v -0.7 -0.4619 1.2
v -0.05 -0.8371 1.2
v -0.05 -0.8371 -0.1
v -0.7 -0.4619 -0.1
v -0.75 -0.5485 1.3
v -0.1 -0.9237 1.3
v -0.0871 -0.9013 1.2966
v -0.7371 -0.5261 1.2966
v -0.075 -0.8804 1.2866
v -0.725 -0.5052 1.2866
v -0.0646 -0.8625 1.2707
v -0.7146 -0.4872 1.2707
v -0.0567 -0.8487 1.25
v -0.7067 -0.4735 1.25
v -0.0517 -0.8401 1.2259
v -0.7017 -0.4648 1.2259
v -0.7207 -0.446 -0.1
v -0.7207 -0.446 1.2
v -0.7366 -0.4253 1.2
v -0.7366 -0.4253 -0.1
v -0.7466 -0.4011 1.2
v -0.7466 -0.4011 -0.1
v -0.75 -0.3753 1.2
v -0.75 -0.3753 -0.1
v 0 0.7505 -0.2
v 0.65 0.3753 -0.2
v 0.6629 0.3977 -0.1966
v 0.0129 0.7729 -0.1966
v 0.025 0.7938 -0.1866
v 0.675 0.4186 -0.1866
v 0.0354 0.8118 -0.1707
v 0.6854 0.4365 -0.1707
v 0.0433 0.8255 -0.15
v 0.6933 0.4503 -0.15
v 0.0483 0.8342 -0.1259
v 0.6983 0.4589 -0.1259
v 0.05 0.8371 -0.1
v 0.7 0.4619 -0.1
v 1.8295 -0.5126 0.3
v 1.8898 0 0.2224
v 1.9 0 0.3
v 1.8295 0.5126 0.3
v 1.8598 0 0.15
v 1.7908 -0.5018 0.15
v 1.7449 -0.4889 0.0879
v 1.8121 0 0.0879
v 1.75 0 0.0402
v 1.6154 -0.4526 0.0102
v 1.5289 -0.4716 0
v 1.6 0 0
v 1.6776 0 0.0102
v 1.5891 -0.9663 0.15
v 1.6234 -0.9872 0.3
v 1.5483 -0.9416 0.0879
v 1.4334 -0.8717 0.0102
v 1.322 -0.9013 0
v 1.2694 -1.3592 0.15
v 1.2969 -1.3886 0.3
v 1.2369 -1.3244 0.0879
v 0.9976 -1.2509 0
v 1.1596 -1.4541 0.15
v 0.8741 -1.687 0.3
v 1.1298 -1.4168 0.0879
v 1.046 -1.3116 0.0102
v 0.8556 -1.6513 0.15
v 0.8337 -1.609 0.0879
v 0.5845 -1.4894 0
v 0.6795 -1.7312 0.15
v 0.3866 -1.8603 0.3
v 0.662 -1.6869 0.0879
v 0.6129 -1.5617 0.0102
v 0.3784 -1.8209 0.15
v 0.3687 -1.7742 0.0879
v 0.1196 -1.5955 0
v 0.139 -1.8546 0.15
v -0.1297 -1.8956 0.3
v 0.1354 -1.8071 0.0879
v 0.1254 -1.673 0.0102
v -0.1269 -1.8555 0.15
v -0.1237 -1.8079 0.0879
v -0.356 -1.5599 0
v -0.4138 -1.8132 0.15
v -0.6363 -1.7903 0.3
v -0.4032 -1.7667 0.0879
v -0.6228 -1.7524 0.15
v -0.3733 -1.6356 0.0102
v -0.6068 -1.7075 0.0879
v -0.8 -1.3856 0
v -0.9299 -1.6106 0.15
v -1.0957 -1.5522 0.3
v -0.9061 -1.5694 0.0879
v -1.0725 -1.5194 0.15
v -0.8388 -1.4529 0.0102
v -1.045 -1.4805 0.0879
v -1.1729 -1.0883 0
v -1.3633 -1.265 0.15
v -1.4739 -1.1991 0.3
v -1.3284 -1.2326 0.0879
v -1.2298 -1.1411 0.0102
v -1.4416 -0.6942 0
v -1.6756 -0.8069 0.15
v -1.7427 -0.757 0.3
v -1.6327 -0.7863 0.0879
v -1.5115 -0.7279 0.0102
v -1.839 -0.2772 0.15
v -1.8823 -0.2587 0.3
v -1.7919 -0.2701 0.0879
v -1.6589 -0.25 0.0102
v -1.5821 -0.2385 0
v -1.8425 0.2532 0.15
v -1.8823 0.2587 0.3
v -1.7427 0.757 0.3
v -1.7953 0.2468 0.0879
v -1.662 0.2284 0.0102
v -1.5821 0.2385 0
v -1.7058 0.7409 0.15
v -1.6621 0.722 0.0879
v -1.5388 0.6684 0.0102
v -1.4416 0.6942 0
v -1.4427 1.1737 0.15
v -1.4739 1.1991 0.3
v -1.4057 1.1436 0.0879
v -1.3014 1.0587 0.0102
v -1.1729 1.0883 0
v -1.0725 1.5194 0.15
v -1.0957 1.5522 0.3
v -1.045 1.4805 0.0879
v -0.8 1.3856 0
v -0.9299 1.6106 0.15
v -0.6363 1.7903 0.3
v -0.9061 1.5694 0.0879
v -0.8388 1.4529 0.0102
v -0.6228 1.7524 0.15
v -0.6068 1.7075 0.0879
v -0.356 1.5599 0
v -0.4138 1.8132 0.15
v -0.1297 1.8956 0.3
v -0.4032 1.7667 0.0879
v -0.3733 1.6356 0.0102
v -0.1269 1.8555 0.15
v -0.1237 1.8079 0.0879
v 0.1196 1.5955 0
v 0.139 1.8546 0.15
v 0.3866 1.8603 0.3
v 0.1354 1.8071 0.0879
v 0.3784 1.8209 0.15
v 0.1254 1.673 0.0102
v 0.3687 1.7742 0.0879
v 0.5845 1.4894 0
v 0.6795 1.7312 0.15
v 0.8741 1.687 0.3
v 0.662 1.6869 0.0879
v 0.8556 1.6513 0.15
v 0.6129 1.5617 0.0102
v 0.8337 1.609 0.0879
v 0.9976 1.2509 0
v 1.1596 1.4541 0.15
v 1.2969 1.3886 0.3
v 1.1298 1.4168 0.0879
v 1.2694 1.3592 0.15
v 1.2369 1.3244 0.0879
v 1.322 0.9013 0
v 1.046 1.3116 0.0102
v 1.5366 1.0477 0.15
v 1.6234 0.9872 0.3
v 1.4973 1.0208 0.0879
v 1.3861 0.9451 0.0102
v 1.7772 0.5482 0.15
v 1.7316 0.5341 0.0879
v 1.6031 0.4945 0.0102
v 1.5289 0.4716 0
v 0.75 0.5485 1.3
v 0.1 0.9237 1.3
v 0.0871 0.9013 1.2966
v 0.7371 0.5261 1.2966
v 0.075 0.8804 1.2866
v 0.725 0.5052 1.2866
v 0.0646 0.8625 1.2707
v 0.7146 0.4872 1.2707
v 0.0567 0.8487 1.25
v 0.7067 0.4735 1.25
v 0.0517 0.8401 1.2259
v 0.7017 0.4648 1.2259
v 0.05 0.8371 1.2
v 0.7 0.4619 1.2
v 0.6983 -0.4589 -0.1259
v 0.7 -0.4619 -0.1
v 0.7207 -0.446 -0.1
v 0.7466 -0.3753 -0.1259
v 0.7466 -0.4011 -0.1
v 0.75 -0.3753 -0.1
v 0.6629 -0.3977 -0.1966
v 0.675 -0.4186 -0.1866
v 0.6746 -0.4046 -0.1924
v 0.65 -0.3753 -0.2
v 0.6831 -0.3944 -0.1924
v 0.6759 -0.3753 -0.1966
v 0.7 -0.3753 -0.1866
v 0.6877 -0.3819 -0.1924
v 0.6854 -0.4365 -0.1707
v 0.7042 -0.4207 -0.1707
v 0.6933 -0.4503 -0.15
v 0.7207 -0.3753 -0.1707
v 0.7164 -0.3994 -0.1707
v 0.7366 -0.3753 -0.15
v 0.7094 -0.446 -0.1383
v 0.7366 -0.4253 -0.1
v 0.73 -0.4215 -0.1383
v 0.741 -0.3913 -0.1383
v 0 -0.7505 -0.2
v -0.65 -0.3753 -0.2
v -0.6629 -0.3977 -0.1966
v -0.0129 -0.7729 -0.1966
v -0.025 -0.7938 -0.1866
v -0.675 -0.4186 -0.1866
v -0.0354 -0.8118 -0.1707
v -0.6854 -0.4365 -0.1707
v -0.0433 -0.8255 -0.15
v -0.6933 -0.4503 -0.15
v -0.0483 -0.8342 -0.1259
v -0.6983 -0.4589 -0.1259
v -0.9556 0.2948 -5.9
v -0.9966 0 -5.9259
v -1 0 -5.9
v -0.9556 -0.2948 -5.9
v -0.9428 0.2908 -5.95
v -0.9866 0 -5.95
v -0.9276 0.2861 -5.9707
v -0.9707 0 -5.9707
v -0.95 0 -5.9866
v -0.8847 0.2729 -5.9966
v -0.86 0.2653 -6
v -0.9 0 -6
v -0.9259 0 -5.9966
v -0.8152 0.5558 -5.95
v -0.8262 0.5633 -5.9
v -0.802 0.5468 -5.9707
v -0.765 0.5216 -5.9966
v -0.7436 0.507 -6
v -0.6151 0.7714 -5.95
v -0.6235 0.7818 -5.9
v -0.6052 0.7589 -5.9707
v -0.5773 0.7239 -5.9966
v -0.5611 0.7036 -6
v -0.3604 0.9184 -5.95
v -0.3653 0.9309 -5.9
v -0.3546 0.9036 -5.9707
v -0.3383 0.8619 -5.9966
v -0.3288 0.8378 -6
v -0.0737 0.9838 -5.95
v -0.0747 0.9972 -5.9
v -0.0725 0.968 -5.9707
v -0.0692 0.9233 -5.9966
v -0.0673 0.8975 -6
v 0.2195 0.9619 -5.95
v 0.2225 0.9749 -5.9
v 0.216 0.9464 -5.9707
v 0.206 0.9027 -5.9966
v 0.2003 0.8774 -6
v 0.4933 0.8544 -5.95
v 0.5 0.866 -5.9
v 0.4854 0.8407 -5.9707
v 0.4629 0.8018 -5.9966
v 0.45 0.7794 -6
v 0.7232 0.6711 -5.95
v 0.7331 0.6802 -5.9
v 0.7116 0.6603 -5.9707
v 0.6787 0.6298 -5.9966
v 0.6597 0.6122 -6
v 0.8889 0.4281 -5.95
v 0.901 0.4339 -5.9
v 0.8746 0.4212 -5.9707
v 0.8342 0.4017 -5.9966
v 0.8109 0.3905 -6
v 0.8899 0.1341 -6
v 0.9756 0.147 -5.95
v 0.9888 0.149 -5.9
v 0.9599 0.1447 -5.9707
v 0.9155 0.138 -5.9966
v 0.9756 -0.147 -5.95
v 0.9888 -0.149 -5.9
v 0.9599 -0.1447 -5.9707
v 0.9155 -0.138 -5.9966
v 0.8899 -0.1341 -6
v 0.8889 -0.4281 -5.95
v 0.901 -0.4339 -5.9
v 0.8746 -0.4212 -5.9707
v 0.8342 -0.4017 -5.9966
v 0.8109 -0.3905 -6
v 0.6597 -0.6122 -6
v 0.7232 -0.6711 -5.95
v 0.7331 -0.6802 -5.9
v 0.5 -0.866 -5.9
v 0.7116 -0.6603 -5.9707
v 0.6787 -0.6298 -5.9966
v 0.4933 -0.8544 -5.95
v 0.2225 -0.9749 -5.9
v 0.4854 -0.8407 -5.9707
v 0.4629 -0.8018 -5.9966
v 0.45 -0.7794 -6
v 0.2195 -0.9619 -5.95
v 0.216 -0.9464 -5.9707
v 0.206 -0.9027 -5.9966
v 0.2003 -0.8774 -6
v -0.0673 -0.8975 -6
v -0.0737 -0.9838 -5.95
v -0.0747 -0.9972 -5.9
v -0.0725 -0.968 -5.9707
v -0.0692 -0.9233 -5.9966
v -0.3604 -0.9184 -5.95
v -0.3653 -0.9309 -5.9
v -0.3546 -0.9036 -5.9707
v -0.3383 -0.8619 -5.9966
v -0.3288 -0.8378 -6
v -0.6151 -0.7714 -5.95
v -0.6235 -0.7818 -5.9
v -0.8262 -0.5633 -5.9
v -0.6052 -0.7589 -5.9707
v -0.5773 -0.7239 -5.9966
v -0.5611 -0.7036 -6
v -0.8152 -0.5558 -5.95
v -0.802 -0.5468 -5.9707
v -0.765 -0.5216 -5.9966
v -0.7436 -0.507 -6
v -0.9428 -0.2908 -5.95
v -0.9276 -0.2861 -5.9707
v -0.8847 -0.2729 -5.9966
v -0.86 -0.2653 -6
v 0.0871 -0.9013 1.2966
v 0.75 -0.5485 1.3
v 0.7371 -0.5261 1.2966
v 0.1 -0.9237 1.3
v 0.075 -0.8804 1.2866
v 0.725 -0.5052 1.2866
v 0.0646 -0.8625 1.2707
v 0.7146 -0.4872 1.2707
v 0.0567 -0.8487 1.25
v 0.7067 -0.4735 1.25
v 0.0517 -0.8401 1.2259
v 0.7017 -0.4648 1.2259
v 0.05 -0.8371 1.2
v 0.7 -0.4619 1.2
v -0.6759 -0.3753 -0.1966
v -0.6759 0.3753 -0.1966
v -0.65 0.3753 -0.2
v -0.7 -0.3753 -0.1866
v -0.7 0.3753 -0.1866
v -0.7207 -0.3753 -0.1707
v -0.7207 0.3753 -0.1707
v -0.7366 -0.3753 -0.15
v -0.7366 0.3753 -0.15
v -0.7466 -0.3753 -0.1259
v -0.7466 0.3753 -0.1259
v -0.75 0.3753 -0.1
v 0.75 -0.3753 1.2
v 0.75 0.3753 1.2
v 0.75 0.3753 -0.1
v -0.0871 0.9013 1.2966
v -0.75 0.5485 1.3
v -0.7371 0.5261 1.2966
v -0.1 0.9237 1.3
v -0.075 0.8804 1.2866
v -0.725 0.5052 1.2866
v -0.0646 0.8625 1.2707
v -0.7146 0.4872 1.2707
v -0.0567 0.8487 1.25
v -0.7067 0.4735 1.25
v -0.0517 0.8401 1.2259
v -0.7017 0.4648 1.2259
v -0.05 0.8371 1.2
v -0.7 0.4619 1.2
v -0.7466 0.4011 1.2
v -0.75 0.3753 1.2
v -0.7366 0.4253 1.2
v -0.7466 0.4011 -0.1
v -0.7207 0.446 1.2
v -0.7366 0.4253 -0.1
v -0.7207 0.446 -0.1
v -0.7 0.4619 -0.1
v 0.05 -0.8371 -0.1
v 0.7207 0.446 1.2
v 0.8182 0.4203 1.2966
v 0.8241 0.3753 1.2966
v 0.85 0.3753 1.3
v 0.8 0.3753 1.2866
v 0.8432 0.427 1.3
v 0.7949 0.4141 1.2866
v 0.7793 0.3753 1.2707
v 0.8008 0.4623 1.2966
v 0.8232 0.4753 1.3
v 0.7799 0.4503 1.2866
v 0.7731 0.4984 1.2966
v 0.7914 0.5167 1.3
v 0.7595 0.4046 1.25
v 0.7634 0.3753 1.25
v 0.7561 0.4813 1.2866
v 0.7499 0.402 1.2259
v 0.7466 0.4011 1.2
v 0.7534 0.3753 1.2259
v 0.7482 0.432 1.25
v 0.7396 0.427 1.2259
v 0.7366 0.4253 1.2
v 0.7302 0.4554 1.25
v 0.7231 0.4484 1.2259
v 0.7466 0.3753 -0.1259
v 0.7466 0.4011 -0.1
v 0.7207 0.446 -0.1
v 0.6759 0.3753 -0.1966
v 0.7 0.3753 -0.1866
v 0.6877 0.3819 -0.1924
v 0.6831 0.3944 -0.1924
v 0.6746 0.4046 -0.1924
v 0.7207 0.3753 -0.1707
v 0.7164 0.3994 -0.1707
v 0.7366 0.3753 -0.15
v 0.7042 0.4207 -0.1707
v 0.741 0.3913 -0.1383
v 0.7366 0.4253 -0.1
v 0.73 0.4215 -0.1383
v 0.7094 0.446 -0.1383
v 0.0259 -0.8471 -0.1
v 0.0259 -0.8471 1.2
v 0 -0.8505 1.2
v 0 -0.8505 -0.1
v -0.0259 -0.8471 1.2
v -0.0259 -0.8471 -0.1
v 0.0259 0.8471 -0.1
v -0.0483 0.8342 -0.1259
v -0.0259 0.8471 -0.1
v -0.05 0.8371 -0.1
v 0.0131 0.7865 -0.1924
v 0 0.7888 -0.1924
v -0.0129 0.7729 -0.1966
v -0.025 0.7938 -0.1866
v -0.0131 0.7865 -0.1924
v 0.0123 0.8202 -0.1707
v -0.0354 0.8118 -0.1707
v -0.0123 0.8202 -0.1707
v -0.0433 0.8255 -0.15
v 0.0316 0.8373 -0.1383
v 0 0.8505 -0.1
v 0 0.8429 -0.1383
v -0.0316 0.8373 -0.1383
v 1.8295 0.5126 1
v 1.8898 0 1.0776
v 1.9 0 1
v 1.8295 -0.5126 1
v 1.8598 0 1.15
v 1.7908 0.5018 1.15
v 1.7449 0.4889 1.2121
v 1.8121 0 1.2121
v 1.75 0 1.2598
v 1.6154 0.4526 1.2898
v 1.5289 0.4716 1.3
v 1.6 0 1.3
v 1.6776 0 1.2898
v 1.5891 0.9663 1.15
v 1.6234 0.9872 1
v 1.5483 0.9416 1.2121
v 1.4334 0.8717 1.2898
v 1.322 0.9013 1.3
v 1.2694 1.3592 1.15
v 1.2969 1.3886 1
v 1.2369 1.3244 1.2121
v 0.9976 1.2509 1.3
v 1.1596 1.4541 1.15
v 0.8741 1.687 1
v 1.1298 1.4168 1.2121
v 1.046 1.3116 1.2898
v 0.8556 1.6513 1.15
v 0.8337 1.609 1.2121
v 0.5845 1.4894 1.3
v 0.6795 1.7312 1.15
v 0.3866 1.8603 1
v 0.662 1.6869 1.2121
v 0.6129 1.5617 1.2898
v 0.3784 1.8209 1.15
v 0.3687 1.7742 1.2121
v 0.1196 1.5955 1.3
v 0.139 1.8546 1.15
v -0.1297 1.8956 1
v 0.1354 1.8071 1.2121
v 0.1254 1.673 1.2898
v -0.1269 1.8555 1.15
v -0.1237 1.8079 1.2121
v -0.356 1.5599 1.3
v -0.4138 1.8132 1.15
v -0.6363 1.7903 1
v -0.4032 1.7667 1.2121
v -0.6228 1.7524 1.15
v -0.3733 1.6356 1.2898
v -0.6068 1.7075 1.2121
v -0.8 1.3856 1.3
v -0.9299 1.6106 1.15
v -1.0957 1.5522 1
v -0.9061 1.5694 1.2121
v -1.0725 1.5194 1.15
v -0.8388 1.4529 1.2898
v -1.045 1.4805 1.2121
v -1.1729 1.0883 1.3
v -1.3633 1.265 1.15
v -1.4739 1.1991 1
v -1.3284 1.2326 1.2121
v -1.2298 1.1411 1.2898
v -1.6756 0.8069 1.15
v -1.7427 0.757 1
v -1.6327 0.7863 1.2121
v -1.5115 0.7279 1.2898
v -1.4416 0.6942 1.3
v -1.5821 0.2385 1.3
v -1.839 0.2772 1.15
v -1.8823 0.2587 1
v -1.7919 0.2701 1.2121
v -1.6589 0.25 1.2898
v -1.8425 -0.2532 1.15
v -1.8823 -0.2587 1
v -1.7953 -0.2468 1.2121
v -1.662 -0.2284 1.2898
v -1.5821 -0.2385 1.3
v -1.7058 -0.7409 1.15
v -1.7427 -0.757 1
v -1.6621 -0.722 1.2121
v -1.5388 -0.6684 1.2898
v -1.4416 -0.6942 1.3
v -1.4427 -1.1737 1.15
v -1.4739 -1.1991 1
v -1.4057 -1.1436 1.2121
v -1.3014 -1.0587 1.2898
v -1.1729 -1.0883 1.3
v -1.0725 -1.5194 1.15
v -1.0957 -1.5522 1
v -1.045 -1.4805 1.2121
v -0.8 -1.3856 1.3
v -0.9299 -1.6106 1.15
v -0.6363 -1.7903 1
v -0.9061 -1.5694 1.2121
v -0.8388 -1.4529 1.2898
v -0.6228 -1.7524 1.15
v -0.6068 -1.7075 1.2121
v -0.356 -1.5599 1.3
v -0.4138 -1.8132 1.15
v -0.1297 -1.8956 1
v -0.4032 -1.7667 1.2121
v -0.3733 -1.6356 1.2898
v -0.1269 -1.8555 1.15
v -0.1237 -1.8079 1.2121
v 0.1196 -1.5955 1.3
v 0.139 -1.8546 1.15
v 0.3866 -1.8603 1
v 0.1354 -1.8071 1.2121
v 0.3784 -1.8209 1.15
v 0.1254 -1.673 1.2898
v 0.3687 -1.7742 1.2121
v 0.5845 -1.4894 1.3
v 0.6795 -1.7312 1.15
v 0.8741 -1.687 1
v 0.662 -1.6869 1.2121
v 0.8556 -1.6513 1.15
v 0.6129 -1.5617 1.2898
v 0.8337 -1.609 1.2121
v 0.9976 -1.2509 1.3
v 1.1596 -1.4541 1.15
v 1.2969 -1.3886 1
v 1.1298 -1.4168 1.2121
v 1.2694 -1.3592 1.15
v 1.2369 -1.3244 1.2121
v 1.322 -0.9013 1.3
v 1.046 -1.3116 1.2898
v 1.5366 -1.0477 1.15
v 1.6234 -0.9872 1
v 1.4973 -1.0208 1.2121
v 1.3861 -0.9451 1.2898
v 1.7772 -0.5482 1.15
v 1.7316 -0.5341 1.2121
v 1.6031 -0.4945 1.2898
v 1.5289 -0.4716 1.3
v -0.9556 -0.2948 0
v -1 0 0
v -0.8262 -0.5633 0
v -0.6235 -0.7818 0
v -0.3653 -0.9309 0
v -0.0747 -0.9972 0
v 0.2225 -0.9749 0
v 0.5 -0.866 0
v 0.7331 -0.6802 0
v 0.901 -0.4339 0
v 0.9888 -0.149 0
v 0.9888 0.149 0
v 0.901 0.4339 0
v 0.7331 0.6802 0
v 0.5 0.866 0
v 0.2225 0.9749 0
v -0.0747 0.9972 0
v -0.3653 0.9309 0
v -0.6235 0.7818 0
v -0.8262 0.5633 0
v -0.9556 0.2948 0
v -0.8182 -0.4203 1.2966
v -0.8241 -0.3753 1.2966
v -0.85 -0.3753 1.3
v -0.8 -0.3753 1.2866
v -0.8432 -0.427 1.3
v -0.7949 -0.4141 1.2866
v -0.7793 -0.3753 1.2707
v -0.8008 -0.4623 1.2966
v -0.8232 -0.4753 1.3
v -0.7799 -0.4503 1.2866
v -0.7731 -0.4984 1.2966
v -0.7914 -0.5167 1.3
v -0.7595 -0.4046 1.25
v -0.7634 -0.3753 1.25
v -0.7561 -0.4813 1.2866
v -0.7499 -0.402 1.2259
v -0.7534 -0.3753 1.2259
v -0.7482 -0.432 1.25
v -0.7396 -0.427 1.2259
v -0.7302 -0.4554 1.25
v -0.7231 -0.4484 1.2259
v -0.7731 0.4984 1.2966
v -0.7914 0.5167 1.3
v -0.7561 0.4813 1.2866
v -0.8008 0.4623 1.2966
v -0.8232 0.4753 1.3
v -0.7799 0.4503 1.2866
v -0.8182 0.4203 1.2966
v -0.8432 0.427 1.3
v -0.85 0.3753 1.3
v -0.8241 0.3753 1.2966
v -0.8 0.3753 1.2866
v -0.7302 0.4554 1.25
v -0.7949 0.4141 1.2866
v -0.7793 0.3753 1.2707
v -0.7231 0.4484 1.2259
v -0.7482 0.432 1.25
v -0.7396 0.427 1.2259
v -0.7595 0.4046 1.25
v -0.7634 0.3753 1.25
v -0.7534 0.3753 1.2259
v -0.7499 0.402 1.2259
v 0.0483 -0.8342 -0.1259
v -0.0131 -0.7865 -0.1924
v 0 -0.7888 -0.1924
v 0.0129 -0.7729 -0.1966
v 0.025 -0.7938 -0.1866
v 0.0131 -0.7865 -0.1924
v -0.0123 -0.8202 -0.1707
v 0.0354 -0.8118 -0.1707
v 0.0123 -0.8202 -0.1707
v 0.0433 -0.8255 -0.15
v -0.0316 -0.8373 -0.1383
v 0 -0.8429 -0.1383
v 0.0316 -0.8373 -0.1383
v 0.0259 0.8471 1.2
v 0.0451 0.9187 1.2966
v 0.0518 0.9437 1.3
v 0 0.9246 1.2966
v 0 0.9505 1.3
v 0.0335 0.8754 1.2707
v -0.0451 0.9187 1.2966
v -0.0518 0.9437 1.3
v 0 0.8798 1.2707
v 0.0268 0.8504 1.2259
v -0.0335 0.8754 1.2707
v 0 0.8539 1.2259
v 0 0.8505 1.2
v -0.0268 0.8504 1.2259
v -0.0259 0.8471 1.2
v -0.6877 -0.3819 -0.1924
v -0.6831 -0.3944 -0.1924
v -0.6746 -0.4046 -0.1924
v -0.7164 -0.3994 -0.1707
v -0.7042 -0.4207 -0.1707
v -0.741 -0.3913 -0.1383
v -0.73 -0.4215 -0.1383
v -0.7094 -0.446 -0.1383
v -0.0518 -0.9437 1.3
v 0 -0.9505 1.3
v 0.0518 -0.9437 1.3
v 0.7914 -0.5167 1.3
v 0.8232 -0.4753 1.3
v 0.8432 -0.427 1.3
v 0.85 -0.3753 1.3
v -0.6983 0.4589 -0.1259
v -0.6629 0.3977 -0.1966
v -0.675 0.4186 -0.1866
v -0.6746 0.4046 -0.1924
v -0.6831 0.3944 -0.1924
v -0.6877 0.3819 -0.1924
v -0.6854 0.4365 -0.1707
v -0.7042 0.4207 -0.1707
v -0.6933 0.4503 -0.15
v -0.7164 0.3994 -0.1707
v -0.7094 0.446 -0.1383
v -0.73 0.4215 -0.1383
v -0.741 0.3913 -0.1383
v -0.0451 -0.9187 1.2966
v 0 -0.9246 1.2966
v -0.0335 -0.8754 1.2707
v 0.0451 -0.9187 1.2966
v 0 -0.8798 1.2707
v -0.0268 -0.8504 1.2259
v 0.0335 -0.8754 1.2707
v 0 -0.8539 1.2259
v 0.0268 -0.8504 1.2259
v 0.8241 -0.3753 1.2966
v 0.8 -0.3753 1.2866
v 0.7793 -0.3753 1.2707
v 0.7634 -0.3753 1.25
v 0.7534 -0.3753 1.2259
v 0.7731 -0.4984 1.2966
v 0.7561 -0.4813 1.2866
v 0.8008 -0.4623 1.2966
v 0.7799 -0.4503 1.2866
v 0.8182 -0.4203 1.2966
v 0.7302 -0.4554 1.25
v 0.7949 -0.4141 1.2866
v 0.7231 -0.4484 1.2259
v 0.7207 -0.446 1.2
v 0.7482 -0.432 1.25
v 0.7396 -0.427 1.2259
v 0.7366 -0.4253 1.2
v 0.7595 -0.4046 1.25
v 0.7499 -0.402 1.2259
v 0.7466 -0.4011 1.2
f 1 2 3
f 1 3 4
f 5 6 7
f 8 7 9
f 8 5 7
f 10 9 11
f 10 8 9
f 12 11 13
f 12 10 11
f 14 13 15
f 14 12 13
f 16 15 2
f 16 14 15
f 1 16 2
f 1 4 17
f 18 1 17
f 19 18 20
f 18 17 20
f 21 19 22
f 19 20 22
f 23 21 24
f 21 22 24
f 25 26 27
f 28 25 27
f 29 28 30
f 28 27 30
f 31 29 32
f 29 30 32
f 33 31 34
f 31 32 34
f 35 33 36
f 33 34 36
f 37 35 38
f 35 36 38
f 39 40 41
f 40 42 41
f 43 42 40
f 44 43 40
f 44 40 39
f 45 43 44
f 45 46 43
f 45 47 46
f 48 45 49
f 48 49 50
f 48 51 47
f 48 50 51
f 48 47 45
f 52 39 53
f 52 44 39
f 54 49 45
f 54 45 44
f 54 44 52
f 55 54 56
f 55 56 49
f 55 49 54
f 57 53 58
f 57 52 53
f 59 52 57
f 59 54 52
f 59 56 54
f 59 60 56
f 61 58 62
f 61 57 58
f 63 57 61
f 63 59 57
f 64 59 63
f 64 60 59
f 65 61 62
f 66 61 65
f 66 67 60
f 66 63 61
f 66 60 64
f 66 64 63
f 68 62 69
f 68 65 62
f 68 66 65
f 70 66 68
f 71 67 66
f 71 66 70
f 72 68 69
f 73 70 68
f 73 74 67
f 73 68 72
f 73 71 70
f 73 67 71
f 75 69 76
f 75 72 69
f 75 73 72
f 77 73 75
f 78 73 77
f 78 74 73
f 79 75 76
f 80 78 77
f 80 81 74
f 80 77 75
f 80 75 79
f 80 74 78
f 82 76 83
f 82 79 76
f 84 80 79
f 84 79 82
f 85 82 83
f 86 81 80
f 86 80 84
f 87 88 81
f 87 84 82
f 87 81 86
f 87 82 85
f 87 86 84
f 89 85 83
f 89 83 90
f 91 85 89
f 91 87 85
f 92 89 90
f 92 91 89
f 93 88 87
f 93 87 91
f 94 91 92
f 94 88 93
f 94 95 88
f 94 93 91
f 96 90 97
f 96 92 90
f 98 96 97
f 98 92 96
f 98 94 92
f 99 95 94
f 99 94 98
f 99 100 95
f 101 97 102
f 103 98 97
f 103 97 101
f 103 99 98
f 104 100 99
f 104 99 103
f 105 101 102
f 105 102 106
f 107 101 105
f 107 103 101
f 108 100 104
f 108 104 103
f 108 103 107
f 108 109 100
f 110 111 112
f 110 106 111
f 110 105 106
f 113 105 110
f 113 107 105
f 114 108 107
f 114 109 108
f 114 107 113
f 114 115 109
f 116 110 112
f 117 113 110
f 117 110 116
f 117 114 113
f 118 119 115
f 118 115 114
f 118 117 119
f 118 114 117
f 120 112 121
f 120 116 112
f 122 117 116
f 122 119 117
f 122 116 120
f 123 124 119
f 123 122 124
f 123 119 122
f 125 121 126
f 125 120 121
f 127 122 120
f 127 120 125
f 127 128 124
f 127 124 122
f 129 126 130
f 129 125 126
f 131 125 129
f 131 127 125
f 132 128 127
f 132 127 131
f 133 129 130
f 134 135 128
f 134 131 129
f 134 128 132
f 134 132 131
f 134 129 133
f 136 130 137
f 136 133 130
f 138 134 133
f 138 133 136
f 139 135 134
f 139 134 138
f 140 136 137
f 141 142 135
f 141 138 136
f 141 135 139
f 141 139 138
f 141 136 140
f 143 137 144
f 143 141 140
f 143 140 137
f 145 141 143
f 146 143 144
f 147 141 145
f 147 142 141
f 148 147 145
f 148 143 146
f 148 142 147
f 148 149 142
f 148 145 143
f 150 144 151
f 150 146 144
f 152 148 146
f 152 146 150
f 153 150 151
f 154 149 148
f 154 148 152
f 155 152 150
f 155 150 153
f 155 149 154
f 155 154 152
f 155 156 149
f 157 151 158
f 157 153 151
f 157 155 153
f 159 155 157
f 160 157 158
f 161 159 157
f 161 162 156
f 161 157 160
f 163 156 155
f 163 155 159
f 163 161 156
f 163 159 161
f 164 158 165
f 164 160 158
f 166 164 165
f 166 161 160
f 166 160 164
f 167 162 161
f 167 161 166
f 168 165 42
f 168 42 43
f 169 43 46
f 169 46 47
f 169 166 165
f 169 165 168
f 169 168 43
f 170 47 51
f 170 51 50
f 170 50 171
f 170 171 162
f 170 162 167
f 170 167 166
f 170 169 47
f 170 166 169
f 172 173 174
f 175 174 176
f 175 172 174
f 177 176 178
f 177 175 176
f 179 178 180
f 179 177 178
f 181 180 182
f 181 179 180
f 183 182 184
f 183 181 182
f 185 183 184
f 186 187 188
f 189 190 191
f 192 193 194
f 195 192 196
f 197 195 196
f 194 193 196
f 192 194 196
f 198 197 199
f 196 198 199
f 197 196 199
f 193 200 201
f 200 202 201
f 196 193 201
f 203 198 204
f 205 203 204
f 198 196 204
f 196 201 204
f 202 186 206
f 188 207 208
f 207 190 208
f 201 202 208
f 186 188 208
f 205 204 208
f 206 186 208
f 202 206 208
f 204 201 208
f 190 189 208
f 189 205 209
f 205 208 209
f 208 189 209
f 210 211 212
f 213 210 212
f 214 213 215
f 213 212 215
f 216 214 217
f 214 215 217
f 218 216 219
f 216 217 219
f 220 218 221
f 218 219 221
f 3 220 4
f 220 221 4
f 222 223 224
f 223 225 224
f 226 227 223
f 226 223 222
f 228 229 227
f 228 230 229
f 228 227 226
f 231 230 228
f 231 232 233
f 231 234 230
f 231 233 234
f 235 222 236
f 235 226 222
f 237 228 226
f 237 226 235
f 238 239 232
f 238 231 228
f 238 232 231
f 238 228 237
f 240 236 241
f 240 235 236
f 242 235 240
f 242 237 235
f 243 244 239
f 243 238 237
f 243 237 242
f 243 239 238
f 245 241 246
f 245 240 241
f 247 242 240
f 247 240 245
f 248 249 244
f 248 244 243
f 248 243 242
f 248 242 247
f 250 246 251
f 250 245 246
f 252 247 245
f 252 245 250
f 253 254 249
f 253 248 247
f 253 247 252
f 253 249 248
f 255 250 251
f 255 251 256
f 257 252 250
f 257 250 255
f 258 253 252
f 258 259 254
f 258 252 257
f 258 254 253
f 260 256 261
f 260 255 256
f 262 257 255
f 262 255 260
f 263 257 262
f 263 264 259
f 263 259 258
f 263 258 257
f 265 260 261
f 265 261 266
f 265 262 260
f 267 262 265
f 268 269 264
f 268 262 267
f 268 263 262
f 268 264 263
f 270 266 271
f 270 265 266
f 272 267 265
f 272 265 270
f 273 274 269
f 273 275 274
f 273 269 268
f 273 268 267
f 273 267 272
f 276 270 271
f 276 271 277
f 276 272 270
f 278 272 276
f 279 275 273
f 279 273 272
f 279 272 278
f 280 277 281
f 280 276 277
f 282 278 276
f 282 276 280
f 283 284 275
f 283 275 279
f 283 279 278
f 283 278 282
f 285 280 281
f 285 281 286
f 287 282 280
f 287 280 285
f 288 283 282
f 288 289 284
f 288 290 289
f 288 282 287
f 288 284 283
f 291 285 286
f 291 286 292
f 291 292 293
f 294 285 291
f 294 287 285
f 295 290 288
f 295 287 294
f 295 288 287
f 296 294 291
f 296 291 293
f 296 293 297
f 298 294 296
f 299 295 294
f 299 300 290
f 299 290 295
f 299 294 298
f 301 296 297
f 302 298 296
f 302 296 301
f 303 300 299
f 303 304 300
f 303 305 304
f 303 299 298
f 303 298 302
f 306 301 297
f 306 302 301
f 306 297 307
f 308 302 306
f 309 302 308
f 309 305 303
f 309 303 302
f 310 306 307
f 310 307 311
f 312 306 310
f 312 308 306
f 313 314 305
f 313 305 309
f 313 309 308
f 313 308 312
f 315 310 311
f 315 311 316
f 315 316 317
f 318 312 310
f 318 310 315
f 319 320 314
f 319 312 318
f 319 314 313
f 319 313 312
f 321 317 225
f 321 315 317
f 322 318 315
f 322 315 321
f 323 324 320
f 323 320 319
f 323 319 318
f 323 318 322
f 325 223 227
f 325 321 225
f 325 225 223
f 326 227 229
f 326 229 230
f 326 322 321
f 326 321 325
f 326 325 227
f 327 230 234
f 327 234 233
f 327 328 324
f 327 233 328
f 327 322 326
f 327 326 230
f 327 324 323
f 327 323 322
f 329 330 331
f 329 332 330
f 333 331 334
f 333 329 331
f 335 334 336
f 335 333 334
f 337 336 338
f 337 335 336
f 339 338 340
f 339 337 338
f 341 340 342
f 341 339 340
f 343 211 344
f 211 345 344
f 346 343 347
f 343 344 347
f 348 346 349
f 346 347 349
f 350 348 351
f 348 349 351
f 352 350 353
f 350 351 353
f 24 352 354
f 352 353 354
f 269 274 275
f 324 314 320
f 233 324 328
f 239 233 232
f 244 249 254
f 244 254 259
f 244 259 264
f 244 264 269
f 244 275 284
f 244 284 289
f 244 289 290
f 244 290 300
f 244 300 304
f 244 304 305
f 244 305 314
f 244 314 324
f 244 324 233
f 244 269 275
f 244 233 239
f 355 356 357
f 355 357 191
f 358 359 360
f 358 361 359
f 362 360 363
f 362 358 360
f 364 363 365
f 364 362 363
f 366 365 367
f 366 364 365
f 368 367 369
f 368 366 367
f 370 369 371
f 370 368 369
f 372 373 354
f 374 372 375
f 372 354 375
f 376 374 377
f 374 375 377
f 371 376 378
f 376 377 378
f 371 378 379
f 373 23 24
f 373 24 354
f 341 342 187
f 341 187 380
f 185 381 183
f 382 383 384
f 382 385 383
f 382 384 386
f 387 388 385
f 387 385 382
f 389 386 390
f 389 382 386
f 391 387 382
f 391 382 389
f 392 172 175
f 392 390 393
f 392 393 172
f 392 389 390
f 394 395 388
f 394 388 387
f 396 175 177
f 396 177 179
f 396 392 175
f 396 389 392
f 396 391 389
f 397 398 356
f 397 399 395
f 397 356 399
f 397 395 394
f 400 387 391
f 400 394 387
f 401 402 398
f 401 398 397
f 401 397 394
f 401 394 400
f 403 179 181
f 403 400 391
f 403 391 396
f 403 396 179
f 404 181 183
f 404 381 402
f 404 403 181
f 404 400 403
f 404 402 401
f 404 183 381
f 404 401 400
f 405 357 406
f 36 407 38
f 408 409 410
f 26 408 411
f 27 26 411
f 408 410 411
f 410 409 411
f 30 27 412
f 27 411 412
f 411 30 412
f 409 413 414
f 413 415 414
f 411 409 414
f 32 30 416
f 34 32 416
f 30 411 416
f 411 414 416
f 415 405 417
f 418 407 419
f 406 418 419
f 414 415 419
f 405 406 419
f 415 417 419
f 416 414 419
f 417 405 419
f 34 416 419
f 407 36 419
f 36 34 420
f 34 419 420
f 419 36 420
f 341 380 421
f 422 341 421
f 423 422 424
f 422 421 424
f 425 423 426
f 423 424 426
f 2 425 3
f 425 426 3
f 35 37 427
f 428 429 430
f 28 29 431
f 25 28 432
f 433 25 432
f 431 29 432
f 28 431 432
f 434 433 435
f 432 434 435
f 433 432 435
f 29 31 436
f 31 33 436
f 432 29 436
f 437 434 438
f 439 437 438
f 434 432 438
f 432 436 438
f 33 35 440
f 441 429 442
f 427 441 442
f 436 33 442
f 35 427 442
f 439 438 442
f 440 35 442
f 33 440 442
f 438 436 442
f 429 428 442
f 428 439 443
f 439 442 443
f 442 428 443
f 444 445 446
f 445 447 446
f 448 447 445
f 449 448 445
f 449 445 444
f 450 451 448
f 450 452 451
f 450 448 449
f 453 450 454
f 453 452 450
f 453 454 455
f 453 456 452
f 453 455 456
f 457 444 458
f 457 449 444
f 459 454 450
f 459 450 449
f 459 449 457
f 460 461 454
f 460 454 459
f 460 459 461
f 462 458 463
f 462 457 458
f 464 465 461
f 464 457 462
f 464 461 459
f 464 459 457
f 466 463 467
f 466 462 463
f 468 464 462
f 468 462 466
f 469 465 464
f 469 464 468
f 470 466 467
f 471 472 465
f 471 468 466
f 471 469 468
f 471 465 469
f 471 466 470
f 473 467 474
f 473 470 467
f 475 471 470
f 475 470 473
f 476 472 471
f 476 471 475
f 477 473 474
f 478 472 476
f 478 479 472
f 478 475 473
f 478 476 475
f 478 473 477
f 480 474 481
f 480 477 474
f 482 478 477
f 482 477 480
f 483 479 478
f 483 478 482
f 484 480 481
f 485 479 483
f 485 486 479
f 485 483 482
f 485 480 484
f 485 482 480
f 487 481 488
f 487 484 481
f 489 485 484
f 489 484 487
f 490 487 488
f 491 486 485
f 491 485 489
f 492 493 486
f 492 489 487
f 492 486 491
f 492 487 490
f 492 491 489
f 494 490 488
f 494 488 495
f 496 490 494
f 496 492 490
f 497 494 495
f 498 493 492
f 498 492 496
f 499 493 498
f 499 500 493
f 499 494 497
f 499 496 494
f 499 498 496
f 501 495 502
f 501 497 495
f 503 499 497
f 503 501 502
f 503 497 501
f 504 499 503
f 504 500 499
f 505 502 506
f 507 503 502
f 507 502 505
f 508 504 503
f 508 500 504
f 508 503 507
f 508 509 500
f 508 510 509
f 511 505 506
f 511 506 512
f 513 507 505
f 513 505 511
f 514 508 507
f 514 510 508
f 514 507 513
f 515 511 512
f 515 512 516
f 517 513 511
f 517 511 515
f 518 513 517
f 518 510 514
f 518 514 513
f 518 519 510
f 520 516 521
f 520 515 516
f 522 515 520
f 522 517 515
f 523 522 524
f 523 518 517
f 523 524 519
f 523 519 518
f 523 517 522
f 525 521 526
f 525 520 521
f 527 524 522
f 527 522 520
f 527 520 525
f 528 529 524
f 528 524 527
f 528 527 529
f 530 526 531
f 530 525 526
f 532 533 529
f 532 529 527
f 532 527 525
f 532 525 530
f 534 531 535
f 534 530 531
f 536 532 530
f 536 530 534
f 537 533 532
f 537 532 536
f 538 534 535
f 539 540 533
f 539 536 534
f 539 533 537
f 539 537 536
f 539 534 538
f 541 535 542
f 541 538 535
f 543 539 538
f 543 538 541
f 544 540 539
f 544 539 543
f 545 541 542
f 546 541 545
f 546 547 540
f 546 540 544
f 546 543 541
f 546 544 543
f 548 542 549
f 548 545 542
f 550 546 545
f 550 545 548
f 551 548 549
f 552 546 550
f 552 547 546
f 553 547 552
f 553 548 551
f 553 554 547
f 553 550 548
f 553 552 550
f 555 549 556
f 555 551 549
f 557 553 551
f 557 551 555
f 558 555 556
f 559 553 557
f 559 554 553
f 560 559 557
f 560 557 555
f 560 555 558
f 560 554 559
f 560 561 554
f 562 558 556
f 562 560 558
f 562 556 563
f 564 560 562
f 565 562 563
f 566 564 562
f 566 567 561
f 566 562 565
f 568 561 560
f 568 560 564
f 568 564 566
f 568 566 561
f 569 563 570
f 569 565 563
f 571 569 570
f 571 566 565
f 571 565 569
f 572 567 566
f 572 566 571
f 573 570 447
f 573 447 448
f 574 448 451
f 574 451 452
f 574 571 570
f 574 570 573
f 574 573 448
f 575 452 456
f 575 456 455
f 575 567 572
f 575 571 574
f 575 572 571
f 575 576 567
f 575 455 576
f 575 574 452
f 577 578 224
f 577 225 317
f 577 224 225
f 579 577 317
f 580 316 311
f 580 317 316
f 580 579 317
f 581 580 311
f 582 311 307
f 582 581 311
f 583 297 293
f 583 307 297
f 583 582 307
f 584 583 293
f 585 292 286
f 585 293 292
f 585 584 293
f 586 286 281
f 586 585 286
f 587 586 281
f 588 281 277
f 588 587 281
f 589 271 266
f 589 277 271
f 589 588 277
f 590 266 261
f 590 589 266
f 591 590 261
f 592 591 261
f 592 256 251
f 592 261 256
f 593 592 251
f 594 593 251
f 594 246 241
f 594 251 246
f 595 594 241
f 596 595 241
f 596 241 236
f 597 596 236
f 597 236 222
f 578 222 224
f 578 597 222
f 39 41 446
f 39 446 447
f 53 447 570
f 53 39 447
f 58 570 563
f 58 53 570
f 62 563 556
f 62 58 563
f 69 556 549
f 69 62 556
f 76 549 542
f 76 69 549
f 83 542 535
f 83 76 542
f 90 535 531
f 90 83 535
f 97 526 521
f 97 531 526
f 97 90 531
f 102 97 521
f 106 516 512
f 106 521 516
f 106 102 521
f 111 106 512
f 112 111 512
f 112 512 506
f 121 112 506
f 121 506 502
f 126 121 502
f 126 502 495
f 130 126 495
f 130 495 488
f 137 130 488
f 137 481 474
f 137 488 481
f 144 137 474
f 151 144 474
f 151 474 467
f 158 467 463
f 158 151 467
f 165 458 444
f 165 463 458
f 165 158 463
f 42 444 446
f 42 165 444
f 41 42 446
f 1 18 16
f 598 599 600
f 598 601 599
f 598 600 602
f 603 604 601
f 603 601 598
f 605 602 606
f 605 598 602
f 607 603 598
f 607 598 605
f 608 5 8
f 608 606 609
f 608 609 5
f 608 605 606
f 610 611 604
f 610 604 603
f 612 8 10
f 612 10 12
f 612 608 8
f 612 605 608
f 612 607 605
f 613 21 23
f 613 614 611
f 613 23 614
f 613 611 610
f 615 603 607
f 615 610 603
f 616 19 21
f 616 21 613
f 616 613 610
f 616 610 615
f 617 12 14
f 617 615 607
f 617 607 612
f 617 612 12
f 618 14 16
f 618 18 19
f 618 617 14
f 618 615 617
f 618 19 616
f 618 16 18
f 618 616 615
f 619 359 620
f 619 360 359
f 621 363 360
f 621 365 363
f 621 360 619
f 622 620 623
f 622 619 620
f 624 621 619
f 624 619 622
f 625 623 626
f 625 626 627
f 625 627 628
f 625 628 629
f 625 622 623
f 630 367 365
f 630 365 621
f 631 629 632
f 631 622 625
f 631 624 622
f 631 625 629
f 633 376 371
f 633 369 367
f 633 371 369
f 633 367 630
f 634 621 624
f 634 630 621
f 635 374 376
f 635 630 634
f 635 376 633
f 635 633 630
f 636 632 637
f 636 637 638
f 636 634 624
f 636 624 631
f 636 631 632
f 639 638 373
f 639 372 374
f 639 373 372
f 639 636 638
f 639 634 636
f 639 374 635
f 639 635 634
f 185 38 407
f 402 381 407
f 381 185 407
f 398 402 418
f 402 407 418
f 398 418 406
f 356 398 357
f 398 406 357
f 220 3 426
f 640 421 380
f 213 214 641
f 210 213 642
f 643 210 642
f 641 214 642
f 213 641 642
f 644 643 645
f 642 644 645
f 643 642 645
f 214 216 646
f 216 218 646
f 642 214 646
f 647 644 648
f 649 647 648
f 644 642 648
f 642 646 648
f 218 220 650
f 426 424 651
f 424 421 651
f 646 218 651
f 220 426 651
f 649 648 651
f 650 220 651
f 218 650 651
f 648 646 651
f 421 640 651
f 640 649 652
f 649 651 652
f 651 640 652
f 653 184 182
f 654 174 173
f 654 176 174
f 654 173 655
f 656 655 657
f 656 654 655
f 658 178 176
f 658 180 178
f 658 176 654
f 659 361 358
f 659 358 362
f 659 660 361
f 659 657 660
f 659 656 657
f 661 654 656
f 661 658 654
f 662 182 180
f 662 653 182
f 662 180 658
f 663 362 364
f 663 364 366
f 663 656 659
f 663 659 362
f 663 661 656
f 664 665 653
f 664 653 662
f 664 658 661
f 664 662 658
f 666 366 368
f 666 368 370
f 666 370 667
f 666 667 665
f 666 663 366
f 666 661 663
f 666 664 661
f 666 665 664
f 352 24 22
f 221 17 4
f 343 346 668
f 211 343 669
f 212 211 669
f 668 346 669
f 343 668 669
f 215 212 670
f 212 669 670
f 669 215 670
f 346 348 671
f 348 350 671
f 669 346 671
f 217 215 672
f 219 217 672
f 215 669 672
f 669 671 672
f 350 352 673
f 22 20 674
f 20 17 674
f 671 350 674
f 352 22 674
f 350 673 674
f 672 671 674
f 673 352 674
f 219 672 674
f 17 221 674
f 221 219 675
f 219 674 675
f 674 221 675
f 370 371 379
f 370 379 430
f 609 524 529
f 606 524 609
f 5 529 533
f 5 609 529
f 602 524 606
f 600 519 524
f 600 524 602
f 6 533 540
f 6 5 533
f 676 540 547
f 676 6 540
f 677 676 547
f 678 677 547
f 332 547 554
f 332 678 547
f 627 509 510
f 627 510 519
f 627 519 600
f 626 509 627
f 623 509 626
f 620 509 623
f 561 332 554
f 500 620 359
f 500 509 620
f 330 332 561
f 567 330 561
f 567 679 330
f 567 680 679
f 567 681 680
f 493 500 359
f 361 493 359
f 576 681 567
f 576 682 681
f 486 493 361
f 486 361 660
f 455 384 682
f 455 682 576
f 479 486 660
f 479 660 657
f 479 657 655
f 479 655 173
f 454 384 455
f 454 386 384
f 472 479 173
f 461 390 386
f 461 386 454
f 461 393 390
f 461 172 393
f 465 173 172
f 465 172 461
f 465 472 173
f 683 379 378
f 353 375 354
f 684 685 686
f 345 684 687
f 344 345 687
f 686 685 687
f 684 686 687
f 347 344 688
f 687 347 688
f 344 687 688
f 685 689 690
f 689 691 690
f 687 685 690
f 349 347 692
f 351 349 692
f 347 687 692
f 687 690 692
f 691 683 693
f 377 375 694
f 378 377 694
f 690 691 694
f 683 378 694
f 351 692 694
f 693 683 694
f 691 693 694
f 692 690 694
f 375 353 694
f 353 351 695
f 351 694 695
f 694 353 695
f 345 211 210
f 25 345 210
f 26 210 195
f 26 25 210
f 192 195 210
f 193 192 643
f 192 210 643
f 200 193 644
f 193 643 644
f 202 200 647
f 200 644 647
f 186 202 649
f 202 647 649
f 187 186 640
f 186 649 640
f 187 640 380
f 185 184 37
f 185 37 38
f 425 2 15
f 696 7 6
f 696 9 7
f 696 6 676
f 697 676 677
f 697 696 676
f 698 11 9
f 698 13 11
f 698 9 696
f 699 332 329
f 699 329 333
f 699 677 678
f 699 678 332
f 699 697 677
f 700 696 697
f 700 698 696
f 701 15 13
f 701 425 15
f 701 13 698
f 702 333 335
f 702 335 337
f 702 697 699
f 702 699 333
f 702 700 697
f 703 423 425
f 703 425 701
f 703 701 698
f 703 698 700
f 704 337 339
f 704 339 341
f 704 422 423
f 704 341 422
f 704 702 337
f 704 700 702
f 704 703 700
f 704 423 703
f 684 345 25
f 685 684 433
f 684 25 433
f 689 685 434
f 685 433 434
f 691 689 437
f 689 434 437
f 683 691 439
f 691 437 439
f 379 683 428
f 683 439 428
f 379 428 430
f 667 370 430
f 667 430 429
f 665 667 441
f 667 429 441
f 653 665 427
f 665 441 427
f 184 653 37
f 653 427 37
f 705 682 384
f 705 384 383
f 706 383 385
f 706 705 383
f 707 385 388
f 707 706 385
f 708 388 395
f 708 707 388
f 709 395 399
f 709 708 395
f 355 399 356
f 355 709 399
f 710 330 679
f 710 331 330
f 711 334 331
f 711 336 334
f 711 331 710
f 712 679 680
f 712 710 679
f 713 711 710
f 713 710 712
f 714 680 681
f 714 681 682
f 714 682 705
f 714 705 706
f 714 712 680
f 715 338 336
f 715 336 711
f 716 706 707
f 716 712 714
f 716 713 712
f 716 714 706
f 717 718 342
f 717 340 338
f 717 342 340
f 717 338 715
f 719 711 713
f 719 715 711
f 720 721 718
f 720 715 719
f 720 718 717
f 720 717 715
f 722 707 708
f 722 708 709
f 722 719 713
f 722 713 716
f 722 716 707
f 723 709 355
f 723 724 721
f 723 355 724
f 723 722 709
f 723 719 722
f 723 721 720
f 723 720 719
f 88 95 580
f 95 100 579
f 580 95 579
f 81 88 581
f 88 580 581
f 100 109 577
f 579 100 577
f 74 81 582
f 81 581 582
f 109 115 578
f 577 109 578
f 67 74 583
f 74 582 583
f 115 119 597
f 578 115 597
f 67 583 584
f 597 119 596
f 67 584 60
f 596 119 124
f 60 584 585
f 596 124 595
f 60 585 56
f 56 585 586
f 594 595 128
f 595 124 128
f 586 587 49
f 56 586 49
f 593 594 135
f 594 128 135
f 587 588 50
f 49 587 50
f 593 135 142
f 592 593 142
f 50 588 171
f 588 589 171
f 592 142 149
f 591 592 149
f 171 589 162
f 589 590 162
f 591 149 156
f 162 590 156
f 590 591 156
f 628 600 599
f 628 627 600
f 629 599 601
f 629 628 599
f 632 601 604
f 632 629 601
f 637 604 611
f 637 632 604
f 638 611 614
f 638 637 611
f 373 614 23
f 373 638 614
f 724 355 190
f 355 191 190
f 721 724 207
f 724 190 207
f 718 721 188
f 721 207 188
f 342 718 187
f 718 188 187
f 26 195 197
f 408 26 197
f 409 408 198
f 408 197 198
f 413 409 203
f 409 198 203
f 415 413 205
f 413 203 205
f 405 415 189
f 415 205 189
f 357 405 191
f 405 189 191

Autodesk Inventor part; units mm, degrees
ref_plane "YZ Plane" through (0, 0, 0) normal (1, 0, 0) x (0, 1, 0)
ref_plane "XZ Plane" through (0, 0, 0) normal (0, 1, 0) x (-1, 0, 0)
ref_plane "XY Plane" through (0, 0, 0) normal (0, 0, 1) x (1, 0, 0)
sketch "スケッチ1" plane through (0, 0, 0) normal (0, 0, 1) x (1, 0, 0)
  circle A0 centre (0, 0) radius 1.9
  dimension "d0" = 3.8
extrude "押し出し1" add sketch "スケッチ1" along normal blind 1.3
sketch "スケッチ2" plane through (0, 0, 0) normal (0, 0, -1) x (-1, 0, 0)
  circle A0 centre (0, 0) radius 1.9 projected
  circle A1 centre (0, 0) radius 1
  dimension "d3" = 2
extrude "押し出し2" add sketch "スケッチ2" along normal blind 6 contours A1
sketch "スケッチ3" plane through (0, 0, 1.3) normal (0, 0, 1) x (1, 0, 0)
  circle A0 centre (0, 0) radius 1.9 projected
  line L0 (0, 0.866) -> (0.75, 0.433)
  line L1 (0.75, 0.433) -> (0.75, -0.433)
  line L2 (0.75, -0.433) -> (0, -0.866)
  line L3 (0, -0.866) -> (-0.75, -0.433)
  line L4 (-0.75, -0.433) -> (-0.75, 0.433)
  line L5 (-0.75, 0.433) -> (0, 0.866)
  dimension "d6" = 0.75
extrude "押し出し3" cut sketch "スケッチ3" against normal blind 1.5 contours L0 L1 L2 L3 L4 L5
fillet "フィレット1" radius 0.3 2 edges at (-1.9, 0, 1.3) (-1.9, 0, 0)
fillet "フィレット2" radius 0.1 19 edges at (-0.375, 0.6495, 1.3) (-0.75, 0, 1.3) (-0.375, -0.6495, 1.3) (0.375, -0.6495, 1.3) (0.75, 0, 1.3) (0.375, 0.6495, 1.3) (-0.375, 0.6495, -0.2) (0.375, 0.6495, -0.2) (0, 0.866, 0.55) (-0.75, 0.433, 0.55) (-0.375, -0.6495, -0.2) (-0.75, -0.433, 0.55) (-0.75, 0, -0.2) (0.75, 0, -0.2) (0.75, 0.433, 0.55) (0.75, -0.433, 0.55) (0.375, -0.6495, -0.2) (0, -0.866, 0.55) (1, 0, -6)
thread "ねじ3" size "M2x0.4" class "6g" standard "ANSI Metric M Profile" full length
